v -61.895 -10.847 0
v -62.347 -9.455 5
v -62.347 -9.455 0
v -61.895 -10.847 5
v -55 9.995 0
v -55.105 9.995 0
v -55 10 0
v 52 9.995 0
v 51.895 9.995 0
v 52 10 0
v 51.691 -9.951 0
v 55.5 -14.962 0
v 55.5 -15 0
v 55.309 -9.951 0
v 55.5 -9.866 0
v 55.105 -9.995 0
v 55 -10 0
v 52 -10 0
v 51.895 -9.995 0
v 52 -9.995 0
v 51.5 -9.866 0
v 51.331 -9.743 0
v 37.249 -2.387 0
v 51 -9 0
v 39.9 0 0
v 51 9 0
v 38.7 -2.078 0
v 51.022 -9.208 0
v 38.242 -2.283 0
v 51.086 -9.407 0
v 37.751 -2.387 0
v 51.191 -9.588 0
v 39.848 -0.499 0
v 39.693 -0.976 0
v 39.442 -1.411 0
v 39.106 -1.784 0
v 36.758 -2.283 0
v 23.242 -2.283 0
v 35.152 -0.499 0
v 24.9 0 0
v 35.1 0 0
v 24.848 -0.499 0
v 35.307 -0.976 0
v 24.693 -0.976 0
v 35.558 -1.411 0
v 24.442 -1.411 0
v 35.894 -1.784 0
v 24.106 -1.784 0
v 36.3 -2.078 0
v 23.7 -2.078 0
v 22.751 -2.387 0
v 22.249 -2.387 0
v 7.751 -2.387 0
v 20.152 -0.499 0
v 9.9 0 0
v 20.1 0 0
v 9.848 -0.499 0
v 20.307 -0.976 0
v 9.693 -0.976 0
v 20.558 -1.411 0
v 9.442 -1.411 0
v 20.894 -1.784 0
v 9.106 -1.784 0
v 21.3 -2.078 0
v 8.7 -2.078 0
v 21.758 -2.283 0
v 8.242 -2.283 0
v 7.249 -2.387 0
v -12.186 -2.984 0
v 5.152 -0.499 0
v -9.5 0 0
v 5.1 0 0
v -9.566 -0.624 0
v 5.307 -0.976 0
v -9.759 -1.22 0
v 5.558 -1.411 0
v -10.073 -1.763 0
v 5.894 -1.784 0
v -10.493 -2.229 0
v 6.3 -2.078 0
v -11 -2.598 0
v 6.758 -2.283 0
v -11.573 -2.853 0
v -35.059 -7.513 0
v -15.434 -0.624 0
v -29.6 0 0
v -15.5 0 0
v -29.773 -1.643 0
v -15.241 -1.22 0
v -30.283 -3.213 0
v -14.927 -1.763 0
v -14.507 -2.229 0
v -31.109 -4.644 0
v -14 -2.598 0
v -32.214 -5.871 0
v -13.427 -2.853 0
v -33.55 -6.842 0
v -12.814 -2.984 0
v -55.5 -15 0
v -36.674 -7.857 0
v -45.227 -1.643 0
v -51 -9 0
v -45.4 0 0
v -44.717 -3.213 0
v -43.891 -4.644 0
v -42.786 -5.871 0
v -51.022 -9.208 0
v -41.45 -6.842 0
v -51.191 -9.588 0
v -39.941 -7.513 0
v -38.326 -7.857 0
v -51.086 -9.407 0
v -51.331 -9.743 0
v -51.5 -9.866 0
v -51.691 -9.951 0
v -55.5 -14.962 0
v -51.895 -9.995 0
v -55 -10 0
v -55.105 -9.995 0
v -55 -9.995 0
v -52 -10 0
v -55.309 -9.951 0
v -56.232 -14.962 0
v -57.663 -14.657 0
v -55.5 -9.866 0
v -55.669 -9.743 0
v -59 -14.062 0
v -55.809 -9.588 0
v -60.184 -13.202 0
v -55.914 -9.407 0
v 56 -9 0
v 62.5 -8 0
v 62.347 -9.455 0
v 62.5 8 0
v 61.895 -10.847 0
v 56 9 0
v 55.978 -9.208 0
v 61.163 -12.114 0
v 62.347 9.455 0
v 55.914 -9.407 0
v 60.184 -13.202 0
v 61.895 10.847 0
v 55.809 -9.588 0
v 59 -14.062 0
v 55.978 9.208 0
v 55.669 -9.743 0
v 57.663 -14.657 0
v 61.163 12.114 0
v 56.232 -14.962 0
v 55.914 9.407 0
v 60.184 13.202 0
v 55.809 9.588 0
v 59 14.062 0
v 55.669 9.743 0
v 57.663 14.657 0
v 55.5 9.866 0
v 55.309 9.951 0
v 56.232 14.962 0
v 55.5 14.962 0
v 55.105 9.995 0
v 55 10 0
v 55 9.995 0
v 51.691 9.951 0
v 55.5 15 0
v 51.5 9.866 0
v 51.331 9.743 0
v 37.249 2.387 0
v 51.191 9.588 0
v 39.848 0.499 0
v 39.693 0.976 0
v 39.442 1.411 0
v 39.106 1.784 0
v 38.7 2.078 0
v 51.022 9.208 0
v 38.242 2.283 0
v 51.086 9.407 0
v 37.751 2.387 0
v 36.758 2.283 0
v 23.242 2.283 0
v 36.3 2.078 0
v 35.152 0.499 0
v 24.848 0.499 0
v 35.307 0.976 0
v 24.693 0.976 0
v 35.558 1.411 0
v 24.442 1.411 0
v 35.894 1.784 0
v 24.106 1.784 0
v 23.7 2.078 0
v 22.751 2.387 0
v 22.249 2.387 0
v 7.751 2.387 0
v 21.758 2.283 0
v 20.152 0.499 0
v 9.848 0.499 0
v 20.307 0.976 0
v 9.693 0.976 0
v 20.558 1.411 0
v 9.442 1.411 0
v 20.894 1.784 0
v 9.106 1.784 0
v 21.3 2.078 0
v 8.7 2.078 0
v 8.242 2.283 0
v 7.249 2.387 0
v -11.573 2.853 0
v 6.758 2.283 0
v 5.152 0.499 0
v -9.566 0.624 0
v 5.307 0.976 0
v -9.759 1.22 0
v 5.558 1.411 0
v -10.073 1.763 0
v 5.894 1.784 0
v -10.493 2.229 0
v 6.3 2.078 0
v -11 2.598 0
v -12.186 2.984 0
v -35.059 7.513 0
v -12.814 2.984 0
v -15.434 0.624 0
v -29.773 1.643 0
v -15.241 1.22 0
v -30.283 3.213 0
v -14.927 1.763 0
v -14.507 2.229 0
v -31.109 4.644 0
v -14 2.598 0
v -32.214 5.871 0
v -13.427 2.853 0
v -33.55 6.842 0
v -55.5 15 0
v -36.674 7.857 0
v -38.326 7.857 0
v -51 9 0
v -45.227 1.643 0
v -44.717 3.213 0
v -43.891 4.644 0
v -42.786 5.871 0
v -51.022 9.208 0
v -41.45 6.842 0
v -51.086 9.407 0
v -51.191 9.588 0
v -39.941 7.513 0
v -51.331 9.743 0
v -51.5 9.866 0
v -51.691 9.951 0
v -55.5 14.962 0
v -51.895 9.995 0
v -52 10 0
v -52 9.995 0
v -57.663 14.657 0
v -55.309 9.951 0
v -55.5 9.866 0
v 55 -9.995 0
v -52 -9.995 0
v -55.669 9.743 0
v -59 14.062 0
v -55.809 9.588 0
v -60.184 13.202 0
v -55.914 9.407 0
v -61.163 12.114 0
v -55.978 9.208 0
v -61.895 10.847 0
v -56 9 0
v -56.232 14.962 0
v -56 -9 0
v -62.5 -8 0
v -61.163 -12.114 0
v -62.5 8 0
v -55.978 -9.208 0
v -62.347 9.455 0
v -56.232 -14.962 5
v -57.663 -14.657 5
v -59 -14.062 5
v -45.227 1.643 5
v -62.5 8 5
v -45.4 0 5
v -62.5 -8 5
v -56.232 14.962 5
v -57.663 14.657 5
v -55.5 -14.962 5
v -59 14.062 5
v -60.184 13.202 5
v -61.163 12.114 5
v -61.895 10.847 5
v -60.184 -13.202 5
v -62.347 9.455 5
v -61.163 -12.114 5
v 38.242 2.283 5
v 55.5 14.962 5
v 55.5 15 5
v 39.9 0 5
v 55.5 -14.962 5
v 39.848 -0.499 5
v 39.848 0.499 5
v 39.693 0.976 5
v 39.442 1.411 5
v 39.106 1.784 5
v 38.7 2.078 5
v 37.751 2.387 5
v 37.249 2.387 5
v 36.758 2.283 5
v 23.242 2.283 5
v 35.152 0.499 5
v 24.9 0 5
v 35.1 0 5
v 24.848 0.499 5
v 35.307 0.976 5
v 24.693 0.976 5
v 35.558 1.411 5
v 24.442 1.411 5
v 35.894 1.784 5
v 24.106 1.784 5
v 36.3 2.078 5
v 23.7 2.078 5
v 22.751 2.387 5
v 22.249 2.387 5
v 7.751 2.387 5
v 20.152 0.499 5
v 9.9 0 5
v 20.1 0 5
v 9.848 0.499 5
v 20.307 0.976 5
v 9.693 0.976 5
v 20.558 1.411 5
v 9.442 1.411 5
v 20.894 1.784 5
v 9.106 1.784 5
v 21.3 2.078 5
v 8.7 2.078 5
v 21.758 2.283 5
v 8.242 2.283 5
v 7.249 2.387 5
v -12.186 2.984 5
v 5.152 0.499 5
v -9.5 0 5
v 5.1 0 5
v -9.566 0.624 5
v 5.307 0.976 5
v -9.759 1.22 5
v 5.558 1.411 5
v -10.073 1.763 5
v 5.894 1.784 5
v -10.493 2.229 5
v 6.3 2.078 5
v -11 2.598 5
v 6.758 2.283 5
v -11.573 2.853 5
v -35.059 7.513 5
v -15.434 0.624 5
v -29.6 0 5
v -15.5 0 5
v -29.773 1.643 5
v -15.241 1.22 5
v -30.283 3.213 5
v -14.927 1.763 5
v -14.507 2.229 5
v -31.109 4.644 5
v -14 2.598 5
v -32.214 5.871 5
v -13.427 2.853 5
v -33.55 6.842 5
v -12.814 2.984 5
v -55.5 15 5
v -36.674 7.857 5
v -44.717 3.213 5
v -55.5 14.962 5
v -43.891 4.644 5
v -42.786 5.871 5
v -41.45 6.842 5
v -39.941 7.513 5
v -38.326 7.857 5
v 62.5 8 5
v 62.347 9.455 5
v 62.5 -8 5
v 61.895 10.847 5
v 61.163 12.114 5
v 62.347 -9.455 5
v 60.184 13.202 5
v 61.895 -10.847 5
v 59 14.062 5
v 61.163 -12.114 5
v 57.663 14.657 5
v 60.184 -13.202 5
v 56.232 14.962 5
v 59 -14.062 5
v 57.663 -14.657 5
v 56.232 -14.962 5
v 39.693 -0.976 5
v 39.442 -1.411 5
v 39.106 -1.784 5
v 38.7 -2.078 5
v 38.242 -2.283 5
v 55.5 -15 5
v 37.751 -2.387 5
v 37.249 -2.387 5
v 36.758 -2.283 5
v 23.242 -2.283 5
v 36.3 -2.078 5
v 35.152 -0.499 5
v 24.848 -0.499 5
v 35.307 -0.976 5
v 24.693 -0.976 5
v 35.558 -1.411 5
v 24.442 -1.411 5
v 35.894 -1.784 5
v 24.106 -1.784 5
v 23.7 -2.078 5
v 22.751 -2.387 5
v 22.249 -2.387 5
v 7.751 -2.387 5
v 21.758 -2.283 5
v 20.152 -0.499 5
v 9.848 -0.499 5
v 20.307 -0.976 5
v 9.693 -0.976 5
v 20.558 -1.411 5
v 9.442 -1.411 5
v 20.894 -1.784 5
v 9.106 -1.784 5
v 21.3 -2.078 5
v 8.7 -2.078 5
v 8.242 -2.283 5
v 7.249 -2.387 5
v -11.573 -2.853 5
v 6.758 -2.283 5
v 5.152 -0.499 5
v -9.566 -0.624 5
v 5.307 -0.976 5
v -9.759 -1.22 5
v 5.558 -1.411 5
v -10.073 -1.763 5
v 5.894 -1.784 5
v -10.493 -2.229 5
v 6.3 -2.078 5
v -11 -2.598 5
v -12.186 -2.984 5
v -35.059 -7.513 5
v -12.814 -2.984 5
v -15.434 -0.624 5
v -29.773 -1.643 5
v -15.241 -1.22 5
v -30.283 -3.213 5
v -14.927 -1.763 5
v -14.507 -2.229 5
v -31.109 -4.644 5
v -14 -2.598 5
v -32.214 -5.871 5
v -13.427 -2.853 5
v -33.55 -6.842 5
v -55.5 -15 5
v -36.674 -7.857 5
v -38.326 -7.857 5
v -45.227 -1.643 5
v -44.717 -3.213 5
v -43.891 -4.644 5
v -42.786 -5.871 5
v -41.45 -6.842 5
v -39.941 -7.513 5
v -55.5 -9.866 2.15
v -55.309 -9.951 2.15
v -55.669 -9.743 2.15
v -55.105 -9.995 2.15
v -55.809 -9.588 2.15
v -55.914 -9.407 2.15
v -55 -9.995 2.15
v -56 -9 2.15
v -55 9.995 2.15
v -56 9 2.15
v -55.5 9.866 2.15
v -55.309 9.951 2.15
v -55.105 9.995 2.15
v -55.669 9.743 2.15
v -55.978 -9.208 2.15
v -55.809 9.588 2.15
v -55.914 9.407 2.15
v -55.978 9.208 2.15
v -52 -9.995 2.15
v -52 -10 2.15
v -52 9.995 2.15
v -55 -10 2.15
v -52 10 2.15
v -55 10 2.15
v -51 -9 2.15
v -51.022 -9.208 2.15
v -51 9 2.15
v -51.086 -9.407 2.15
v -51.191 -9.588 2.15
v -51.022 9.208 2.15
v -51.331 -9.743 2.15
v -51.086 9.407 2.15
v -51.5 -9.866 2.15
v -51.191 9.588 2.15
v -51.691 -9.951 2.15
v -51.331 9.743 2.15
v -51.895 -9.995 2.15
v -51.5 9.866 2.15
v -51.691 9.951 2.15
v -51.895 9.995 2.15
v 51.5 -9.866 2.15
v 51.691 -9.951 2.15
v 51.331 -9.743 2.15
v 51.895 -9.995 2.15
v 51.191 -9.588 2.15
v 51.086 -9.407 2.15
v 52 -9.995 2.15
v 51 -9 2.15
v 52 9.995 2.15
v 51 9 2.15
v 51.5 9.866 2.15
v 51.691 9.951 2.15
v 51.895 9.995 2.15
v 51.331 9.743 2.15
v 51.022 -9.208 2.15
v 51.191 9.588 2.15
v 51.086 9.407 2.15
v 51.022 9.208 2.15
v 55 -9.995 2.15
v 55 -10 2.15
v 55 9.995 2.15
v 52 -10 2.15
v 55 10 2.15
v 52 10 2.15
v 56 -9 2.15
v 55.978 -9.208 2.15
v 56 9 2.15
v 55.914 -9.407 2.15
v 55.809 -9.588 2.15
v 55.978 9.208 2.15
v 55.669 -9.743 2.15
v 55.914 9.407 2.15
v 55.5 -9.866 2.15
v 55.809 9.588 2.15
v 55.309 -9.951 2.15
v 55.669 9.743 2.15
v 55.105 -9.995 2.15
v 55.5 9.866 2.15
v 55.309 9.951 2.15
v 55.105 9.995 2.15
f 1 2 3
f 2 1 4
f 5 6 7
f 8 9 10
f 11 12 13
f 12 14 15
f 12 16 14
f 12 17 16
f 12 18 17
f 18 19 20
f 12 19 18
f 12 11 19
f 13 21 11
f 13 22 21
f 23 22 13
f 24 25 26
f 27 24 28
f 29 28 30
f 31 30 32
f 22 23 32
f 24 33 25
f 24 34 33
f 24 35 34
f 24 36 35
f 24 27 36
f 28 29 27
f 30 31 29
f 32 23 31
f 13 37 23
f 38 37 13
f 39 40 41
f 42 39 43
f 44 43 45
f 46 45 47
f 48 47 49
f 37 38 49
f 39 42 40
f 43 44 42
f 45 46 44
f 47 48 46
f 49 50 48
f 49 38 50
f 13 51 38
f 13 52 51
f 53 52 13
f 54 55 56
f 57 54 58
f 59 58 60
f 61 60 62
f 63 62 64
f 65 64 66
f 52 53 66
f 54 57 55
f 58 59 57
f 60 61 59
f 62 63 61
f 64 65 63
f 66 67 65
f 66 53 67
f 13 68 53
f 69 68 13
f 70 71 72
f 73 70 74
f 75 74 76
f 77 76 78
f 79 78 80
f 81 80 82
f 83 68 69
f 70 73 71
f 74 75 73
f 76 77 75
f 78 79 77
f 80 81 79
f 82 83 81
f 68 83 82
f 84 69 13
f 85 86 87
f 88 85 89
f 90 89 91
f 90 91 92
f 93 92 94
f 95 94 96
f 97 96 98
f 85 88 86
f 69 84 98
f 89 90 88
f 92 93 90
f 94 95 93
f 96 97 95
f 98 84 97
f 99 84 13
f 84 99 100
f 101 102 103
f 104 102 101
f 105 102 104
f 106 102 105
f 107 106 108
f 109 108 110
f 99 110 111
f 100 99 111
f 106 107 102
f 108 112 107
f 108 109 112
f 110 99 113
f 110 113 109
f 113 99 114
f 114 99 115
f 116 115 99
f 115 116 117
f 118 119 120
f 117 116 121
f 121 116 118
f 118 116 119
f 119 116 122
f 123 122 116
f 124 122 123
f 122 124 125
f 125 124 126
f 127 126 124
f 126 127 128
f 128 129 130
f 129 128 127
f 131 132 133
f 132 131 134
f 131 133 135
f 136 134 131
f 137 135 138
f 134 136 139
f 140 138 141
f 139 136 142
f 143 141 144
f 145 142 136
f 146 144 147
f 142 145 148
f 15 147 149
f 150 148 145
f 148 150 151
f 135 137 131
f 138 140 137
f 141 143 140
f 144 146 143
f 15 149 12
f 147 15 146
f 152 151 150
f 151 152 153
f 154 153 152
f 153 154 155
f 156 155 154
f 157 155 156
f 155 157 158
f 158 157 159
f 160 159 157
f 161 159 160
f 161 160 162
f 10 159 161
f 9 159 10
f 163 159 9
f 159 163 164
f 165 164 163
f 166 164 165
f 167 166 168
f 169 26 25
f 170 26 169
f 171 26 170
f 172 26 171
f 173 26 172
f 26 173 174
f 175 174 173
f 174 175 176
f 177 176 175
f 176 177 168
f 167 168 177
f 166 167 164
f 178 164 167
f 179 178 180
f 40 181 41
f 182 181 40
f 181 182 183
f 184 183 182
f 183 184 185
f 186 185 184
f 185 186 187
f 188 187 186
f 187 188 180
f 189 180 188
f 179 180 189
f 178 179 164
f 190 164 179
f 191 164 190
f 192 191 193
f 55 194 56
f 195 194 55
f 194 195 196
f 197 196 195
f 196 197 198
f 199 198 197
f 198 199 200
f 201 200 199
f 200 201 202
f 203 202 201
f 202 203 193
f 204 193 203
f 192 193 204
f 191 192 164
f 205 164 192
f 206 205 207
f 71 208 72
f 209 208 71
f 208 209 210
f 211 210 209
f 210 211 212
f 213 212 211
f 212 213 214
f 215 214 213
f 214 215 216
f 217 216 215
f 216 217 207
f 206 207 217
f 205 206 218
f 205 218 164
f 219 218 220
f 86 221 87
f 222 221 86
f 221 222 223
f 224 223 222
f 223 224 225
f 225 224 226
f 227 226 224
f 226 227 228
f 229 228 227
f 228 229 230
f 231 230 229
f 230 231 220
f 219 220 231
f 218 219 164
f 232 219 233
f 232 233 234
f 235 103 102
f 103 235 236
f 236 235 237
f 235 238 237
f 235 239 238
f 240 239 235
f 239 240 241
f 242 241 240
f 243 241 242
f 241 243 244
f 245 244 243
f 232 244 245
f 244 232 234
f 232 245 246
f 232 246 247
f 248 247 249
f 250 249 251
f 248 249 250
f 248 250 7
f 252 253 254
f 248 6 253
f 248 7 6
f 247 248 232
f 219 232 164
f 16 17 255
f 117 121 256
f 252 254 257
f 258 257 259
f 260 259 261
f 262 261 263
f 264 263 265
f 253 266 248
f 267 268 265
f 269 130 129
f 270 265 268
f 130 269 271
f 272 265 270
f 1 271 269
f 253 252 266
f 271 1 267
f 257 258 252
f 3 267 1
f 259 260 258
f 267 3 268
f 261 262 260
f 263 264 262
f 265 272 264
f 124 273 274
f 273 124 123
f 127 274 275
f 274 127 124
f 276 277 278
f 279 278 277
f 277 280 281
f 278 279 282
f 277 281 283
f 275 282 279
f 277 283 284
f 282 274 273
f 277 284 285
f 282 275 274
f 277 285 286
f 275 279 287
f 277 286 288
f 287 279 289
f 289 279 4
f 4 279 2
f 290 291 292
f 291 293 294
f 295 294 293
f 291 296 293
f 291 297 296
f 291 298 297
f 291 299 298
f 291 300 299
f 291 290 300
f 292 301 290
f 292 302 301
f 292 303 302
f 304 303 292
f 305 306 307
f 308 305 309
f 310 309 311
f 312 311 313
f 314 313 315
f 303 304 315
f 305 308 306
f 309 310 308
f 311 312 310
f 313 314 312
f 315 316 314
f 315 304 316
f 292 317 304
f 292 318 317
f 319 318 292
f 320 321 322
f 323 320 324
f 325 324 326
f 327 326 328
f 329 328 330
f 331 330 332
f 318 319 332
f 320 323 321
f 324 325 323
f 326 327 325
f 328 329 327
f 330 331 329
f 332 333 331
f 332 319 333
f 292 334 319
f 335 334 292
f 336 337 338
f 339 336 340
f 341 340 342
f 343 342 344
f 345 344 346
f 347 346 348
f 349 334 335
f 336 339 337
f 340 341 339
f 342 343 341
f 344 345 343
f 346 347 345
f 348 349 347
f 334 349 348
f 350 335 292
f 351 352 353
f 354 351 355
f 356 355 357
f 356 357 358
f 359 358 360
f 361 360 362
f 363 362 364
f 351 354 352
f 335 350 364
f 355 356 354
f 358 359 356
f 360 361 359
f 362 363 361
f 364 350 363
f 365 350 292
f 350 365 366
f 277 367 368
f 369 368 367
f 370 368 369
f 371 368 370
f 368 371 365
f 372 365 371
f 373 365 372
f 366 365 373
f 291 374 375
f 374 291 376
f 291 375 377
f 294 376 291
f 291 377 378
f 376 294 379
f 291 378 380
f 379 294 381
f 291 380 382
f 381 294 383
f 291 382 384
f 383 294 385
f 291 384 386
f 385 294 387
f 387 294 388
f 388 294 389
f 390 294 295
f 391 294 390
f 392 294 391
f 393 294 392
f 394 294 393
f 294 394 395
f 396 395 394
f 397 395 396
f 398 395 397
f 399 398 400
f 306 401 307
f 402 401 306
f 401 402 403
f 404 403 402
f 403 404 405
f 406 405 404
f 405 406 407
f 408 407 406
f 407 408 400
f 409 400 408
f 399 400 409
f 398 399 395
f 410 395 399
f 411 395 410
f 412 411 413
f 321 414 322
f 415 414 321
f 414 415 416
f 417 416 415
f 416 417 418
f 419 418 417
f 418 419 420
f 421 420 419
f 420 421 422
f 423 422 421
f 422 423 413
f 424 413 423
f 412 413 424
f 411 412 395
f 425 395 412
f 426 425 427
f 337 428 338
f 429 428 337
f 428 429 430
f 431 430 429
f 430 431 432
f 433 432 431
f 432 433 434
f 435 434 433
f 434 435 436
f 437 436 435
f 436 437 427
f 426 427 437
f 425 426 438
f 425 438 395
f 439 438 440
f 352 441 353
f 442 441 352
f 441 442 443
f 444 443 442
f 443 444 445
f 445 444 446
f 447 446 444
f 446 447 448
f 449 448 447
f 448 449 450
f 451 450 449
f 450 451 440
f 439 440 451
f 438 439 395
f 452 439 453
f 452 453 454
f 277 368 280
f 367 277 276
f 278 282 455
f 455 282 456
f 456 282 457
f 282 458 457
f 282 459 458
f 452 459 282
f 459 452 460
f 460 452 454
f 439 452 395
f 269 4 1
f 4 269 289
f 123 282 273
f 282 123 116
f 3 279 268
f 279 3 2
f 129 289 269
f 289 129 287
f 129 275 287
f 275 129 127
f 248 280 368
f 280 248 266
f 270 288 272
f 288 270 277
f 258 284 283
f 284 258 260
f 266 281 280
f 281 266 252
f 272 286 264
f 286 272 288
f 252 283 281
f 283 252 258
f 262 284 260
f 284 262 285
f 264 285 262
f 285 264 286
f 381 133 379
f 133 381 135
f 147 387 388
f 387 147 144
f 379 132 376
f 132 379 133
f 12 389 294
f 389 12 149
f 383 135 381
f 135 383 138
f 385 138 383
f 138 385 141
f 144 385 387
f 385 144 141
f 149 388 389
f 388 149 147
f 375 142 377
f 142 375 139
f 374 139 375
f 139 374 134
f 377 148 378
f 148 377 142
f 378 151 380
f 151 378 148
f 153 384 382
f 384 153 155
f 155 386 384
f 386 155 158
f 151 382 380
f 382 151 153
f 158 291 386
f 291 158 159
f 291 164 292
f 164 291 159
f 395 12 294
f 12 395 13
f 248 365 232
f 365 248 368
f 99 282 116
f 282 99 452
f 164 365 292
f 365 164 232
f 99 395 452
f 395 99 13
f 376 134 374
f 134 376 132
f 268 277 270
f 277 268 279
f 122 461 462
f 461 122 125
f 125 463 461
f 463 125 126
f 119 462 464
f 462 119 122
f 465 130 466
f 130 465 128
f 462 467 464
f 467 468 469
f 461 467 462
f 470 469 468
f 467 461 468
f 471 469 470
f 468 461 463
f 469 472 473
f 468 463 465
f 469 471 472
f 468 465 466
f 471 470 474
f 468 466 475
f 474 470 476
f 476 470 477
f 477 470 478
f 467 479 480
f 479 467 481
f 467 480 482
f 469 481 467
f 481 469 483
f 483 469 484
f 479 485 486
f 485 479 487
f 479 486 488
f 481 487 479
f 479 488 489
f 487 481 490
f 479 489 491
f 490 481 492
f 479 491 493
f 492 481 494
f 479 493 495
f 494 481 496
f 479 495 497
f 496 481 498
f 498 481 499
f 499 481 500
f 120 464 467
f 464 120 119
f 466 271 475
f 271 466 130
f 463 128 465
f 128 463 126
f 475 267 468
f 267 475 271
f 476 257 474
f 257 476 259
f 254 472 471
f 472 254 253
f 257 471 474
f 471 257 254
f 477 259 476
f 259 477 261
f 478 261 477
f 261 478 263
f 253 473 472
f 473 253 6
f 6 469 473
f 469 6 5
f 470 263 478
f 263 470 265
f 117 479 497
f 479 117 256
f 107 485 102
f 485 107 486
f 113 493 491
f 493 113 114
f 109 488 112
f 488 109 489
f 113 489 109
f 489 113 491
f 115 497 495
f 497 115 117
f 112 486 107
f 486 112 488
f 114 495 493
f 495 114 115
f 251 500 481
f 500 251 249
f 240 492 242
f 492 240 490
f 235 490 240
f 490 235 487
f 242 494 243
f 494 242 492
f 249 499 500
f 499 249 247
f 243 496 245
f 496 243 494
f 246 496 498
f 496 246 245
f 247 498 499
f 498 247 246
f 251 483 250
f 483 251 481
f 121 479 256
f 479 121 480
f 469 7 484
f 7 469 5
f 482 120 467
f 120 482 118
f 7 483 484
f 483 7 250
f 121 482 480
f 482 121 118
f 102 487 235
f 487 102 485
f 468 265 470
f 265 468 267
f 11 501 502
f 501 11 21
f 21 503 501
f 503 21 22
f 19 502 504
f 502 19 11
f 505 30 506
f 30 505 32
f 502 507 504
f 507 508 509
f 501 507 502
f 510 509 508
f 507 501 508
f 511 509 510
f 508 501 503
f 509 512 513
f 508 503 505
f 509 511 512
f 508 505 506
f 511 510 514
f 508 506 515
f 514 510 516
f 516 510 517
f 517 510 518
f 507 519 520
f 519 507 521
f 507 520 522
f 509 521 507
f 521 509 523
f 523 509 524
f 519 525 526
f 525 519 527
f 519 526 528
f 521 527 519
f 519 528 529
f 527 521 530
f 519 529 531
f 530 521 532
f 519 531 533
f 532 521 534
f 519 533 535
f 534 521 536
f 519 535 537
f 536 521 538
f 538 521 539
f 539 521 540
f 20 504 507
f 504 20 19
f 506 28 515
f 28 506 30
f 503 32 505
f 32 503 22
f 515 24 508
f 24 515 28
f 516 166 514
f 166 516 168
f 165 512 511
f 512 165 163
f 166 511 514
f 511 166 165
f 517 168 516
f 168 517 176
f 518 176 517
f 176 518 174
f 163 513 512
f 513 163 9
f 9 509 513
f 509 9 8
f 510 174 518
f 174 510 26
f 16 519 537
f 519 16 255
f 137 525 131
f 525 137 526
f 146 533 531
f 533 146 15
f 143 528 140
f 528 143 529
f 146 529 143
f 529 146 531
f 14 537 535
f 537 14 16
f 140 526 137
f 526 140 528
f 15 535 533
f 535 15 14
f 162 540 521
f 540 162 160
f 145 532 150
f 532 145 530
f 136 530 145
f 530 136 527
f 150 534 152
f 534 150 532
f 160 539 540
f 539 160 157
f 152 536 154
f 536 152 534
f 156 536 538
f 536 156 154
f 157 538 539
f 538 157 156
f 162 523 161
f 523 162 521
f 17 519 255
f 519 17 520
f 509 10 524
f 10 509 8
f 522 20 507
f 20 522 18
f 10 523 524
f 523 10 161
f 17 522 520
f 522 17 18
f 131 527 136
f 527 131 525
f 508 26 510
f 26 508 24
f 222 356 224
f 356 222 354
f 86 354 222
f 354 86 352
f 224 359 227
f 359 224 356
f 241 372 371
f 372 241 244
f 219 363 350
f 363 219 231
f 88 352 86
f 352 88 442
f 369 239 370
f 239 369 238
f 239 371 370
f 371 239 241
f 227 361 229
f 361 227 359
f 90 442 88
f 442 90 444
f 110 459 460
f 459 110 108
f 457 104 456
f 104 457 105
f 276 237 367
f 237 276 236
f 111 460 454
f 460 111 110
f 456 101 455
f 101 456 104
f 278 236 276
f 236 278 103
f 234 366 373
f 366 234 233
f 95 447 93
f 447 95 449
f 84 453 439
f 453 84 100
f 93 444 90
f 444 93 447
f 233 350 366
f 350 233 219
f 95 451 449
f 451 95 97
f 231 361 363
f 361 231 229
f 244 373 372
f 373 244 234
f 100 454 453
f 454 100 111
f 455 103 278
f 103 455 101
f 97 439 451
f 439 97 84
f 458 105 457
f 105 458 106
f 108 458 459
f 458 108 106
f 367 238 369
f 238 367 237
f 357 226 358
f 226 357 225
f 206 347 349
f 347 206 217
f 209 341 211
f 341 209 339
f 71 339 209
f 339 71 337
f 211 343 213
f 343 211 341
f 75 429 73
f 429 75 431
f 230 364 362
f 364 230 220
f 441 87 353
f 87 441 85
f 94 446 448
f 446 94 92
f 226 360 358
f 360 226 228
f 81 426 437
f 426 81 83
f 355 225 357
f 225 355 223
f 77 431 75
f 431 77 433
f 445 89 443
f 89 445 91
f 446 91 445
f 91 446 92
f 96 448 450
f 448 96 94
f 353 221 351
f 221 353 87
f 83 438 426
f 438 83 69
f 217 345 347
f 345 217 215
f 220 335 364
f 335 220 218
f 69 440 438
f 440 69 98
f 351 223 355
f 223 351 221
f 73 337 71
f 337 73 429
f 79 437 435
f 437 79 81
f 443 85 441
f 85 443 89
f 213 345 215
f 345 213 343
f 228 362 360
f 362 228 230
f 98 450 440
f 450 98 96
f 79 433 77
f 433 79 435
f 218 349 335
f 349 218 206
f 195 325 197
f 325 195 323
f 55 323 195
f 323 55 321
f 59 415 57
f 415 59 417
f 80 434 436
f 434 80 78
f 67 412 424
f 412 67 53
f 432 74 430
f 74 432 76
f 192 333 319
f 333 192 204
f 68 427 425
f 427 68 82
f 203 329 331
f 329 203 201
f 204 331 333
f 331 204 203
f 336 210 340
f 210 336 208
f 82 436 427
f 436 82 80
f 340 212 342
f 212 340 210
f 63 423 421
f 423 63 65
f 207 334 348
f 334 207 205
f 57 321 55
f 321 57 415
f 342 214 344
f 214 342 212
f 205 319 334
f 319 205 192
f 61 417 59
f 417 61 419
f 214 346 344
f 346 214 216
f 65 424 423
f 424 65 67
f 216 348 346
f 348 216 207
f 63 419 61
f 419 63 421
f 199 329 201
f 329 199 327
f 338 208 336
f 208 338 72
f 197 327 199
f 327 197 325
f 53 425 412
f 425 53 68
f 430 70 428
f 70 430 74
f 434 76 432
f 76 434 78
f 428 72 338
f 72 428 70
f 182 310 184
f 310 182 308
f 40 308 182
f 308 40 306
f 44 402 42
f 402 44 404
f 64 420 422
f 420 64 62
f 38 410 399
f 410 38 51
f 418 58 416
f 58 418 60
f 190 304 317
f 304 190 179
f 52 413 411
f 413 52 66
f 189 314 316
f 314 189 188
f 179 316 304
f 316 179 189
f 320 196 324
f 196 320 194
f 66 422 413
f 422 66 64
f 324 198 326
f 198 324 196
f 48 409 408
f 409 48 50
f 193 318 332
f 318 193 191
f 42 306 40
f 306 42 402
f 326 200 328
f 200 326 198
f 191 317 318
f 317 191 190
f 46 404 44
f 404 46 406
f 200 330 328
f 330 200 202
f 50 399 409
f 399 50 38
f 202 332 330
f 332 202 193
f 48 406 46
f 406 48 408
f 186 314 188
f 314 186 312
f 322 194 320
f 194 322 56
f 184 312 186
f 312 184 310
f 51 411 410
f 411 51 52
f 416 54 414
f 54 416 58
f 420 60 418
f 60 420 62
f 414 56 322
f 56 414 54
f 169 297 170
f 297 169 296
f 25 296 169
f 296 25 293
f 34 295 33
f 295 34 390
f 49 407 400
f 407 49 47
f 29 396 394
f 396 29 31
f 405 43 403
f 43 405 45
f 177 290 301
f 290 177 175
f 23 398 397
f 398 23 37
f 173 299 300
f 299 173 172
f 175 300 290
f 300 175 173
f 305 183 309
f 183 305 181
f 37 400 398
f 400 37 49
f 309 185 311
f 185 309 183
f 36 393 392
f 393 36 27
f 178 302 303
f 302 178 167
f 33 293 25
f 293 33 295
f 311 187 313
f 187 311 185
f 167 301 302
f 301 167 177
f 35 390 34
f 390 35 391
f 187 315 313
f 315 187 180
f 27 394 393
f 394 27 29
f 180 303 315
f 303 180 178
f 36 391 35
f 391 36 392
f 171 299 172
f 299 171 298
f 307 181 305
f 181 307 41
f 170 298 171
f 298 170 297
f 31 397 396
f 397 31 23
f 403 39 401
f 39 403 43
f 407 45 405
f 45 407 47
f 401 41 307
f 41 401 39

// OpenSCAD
$fn = 30;

WIDTH = 125;
LENGTH = 30;
THICKNESS = 5;

use <MCAD/boxes.scad>;

module support() {
    difference() {
        roundedBox([WIDTH, LENGTH, THICKNESS], 7, true);

        translate([- WIDTH / 2 + 25, 0, - THICKNESS]) {
            cylinder(r = 15.8 / 2, h = 20);
        }

        translate([- WIDTH / 2 + 50, 0, - THICKNESS]) {
            cylinder(r = 6 / 2, h = 20);
        }

        translate([- WIDTH / 2 + 70, 0, - THICKNESS]) {
            cylinder(r = 4.8 / 2, h = 20);
        }

        translate([- WIDTH / 2 + 85, 0, - THICKNESS]) {
            cylinder(r = 4.8 / 2, h = 20);
        }

        translate([- WIDTH / 2 + 100, 0, - THICKNESS]) {
            cylinder(r = 4.8 / 2, h = 20);
        }

        translate([- WIDTH / 2 + 9, 0, - THICKNESS / 2 + 0.9]) {
            roundedBox([5, 20, 2.5], 1, true);
        }

        translate([WIDTH / 2 - 9, 0, - THICKNESS / 2 + 0.9]) {
            roundedBox([5, 20, 2.5], 1, true);
        }
    }
}

translate([0, 0, THICKNESS / 2]) {
    support();
}
